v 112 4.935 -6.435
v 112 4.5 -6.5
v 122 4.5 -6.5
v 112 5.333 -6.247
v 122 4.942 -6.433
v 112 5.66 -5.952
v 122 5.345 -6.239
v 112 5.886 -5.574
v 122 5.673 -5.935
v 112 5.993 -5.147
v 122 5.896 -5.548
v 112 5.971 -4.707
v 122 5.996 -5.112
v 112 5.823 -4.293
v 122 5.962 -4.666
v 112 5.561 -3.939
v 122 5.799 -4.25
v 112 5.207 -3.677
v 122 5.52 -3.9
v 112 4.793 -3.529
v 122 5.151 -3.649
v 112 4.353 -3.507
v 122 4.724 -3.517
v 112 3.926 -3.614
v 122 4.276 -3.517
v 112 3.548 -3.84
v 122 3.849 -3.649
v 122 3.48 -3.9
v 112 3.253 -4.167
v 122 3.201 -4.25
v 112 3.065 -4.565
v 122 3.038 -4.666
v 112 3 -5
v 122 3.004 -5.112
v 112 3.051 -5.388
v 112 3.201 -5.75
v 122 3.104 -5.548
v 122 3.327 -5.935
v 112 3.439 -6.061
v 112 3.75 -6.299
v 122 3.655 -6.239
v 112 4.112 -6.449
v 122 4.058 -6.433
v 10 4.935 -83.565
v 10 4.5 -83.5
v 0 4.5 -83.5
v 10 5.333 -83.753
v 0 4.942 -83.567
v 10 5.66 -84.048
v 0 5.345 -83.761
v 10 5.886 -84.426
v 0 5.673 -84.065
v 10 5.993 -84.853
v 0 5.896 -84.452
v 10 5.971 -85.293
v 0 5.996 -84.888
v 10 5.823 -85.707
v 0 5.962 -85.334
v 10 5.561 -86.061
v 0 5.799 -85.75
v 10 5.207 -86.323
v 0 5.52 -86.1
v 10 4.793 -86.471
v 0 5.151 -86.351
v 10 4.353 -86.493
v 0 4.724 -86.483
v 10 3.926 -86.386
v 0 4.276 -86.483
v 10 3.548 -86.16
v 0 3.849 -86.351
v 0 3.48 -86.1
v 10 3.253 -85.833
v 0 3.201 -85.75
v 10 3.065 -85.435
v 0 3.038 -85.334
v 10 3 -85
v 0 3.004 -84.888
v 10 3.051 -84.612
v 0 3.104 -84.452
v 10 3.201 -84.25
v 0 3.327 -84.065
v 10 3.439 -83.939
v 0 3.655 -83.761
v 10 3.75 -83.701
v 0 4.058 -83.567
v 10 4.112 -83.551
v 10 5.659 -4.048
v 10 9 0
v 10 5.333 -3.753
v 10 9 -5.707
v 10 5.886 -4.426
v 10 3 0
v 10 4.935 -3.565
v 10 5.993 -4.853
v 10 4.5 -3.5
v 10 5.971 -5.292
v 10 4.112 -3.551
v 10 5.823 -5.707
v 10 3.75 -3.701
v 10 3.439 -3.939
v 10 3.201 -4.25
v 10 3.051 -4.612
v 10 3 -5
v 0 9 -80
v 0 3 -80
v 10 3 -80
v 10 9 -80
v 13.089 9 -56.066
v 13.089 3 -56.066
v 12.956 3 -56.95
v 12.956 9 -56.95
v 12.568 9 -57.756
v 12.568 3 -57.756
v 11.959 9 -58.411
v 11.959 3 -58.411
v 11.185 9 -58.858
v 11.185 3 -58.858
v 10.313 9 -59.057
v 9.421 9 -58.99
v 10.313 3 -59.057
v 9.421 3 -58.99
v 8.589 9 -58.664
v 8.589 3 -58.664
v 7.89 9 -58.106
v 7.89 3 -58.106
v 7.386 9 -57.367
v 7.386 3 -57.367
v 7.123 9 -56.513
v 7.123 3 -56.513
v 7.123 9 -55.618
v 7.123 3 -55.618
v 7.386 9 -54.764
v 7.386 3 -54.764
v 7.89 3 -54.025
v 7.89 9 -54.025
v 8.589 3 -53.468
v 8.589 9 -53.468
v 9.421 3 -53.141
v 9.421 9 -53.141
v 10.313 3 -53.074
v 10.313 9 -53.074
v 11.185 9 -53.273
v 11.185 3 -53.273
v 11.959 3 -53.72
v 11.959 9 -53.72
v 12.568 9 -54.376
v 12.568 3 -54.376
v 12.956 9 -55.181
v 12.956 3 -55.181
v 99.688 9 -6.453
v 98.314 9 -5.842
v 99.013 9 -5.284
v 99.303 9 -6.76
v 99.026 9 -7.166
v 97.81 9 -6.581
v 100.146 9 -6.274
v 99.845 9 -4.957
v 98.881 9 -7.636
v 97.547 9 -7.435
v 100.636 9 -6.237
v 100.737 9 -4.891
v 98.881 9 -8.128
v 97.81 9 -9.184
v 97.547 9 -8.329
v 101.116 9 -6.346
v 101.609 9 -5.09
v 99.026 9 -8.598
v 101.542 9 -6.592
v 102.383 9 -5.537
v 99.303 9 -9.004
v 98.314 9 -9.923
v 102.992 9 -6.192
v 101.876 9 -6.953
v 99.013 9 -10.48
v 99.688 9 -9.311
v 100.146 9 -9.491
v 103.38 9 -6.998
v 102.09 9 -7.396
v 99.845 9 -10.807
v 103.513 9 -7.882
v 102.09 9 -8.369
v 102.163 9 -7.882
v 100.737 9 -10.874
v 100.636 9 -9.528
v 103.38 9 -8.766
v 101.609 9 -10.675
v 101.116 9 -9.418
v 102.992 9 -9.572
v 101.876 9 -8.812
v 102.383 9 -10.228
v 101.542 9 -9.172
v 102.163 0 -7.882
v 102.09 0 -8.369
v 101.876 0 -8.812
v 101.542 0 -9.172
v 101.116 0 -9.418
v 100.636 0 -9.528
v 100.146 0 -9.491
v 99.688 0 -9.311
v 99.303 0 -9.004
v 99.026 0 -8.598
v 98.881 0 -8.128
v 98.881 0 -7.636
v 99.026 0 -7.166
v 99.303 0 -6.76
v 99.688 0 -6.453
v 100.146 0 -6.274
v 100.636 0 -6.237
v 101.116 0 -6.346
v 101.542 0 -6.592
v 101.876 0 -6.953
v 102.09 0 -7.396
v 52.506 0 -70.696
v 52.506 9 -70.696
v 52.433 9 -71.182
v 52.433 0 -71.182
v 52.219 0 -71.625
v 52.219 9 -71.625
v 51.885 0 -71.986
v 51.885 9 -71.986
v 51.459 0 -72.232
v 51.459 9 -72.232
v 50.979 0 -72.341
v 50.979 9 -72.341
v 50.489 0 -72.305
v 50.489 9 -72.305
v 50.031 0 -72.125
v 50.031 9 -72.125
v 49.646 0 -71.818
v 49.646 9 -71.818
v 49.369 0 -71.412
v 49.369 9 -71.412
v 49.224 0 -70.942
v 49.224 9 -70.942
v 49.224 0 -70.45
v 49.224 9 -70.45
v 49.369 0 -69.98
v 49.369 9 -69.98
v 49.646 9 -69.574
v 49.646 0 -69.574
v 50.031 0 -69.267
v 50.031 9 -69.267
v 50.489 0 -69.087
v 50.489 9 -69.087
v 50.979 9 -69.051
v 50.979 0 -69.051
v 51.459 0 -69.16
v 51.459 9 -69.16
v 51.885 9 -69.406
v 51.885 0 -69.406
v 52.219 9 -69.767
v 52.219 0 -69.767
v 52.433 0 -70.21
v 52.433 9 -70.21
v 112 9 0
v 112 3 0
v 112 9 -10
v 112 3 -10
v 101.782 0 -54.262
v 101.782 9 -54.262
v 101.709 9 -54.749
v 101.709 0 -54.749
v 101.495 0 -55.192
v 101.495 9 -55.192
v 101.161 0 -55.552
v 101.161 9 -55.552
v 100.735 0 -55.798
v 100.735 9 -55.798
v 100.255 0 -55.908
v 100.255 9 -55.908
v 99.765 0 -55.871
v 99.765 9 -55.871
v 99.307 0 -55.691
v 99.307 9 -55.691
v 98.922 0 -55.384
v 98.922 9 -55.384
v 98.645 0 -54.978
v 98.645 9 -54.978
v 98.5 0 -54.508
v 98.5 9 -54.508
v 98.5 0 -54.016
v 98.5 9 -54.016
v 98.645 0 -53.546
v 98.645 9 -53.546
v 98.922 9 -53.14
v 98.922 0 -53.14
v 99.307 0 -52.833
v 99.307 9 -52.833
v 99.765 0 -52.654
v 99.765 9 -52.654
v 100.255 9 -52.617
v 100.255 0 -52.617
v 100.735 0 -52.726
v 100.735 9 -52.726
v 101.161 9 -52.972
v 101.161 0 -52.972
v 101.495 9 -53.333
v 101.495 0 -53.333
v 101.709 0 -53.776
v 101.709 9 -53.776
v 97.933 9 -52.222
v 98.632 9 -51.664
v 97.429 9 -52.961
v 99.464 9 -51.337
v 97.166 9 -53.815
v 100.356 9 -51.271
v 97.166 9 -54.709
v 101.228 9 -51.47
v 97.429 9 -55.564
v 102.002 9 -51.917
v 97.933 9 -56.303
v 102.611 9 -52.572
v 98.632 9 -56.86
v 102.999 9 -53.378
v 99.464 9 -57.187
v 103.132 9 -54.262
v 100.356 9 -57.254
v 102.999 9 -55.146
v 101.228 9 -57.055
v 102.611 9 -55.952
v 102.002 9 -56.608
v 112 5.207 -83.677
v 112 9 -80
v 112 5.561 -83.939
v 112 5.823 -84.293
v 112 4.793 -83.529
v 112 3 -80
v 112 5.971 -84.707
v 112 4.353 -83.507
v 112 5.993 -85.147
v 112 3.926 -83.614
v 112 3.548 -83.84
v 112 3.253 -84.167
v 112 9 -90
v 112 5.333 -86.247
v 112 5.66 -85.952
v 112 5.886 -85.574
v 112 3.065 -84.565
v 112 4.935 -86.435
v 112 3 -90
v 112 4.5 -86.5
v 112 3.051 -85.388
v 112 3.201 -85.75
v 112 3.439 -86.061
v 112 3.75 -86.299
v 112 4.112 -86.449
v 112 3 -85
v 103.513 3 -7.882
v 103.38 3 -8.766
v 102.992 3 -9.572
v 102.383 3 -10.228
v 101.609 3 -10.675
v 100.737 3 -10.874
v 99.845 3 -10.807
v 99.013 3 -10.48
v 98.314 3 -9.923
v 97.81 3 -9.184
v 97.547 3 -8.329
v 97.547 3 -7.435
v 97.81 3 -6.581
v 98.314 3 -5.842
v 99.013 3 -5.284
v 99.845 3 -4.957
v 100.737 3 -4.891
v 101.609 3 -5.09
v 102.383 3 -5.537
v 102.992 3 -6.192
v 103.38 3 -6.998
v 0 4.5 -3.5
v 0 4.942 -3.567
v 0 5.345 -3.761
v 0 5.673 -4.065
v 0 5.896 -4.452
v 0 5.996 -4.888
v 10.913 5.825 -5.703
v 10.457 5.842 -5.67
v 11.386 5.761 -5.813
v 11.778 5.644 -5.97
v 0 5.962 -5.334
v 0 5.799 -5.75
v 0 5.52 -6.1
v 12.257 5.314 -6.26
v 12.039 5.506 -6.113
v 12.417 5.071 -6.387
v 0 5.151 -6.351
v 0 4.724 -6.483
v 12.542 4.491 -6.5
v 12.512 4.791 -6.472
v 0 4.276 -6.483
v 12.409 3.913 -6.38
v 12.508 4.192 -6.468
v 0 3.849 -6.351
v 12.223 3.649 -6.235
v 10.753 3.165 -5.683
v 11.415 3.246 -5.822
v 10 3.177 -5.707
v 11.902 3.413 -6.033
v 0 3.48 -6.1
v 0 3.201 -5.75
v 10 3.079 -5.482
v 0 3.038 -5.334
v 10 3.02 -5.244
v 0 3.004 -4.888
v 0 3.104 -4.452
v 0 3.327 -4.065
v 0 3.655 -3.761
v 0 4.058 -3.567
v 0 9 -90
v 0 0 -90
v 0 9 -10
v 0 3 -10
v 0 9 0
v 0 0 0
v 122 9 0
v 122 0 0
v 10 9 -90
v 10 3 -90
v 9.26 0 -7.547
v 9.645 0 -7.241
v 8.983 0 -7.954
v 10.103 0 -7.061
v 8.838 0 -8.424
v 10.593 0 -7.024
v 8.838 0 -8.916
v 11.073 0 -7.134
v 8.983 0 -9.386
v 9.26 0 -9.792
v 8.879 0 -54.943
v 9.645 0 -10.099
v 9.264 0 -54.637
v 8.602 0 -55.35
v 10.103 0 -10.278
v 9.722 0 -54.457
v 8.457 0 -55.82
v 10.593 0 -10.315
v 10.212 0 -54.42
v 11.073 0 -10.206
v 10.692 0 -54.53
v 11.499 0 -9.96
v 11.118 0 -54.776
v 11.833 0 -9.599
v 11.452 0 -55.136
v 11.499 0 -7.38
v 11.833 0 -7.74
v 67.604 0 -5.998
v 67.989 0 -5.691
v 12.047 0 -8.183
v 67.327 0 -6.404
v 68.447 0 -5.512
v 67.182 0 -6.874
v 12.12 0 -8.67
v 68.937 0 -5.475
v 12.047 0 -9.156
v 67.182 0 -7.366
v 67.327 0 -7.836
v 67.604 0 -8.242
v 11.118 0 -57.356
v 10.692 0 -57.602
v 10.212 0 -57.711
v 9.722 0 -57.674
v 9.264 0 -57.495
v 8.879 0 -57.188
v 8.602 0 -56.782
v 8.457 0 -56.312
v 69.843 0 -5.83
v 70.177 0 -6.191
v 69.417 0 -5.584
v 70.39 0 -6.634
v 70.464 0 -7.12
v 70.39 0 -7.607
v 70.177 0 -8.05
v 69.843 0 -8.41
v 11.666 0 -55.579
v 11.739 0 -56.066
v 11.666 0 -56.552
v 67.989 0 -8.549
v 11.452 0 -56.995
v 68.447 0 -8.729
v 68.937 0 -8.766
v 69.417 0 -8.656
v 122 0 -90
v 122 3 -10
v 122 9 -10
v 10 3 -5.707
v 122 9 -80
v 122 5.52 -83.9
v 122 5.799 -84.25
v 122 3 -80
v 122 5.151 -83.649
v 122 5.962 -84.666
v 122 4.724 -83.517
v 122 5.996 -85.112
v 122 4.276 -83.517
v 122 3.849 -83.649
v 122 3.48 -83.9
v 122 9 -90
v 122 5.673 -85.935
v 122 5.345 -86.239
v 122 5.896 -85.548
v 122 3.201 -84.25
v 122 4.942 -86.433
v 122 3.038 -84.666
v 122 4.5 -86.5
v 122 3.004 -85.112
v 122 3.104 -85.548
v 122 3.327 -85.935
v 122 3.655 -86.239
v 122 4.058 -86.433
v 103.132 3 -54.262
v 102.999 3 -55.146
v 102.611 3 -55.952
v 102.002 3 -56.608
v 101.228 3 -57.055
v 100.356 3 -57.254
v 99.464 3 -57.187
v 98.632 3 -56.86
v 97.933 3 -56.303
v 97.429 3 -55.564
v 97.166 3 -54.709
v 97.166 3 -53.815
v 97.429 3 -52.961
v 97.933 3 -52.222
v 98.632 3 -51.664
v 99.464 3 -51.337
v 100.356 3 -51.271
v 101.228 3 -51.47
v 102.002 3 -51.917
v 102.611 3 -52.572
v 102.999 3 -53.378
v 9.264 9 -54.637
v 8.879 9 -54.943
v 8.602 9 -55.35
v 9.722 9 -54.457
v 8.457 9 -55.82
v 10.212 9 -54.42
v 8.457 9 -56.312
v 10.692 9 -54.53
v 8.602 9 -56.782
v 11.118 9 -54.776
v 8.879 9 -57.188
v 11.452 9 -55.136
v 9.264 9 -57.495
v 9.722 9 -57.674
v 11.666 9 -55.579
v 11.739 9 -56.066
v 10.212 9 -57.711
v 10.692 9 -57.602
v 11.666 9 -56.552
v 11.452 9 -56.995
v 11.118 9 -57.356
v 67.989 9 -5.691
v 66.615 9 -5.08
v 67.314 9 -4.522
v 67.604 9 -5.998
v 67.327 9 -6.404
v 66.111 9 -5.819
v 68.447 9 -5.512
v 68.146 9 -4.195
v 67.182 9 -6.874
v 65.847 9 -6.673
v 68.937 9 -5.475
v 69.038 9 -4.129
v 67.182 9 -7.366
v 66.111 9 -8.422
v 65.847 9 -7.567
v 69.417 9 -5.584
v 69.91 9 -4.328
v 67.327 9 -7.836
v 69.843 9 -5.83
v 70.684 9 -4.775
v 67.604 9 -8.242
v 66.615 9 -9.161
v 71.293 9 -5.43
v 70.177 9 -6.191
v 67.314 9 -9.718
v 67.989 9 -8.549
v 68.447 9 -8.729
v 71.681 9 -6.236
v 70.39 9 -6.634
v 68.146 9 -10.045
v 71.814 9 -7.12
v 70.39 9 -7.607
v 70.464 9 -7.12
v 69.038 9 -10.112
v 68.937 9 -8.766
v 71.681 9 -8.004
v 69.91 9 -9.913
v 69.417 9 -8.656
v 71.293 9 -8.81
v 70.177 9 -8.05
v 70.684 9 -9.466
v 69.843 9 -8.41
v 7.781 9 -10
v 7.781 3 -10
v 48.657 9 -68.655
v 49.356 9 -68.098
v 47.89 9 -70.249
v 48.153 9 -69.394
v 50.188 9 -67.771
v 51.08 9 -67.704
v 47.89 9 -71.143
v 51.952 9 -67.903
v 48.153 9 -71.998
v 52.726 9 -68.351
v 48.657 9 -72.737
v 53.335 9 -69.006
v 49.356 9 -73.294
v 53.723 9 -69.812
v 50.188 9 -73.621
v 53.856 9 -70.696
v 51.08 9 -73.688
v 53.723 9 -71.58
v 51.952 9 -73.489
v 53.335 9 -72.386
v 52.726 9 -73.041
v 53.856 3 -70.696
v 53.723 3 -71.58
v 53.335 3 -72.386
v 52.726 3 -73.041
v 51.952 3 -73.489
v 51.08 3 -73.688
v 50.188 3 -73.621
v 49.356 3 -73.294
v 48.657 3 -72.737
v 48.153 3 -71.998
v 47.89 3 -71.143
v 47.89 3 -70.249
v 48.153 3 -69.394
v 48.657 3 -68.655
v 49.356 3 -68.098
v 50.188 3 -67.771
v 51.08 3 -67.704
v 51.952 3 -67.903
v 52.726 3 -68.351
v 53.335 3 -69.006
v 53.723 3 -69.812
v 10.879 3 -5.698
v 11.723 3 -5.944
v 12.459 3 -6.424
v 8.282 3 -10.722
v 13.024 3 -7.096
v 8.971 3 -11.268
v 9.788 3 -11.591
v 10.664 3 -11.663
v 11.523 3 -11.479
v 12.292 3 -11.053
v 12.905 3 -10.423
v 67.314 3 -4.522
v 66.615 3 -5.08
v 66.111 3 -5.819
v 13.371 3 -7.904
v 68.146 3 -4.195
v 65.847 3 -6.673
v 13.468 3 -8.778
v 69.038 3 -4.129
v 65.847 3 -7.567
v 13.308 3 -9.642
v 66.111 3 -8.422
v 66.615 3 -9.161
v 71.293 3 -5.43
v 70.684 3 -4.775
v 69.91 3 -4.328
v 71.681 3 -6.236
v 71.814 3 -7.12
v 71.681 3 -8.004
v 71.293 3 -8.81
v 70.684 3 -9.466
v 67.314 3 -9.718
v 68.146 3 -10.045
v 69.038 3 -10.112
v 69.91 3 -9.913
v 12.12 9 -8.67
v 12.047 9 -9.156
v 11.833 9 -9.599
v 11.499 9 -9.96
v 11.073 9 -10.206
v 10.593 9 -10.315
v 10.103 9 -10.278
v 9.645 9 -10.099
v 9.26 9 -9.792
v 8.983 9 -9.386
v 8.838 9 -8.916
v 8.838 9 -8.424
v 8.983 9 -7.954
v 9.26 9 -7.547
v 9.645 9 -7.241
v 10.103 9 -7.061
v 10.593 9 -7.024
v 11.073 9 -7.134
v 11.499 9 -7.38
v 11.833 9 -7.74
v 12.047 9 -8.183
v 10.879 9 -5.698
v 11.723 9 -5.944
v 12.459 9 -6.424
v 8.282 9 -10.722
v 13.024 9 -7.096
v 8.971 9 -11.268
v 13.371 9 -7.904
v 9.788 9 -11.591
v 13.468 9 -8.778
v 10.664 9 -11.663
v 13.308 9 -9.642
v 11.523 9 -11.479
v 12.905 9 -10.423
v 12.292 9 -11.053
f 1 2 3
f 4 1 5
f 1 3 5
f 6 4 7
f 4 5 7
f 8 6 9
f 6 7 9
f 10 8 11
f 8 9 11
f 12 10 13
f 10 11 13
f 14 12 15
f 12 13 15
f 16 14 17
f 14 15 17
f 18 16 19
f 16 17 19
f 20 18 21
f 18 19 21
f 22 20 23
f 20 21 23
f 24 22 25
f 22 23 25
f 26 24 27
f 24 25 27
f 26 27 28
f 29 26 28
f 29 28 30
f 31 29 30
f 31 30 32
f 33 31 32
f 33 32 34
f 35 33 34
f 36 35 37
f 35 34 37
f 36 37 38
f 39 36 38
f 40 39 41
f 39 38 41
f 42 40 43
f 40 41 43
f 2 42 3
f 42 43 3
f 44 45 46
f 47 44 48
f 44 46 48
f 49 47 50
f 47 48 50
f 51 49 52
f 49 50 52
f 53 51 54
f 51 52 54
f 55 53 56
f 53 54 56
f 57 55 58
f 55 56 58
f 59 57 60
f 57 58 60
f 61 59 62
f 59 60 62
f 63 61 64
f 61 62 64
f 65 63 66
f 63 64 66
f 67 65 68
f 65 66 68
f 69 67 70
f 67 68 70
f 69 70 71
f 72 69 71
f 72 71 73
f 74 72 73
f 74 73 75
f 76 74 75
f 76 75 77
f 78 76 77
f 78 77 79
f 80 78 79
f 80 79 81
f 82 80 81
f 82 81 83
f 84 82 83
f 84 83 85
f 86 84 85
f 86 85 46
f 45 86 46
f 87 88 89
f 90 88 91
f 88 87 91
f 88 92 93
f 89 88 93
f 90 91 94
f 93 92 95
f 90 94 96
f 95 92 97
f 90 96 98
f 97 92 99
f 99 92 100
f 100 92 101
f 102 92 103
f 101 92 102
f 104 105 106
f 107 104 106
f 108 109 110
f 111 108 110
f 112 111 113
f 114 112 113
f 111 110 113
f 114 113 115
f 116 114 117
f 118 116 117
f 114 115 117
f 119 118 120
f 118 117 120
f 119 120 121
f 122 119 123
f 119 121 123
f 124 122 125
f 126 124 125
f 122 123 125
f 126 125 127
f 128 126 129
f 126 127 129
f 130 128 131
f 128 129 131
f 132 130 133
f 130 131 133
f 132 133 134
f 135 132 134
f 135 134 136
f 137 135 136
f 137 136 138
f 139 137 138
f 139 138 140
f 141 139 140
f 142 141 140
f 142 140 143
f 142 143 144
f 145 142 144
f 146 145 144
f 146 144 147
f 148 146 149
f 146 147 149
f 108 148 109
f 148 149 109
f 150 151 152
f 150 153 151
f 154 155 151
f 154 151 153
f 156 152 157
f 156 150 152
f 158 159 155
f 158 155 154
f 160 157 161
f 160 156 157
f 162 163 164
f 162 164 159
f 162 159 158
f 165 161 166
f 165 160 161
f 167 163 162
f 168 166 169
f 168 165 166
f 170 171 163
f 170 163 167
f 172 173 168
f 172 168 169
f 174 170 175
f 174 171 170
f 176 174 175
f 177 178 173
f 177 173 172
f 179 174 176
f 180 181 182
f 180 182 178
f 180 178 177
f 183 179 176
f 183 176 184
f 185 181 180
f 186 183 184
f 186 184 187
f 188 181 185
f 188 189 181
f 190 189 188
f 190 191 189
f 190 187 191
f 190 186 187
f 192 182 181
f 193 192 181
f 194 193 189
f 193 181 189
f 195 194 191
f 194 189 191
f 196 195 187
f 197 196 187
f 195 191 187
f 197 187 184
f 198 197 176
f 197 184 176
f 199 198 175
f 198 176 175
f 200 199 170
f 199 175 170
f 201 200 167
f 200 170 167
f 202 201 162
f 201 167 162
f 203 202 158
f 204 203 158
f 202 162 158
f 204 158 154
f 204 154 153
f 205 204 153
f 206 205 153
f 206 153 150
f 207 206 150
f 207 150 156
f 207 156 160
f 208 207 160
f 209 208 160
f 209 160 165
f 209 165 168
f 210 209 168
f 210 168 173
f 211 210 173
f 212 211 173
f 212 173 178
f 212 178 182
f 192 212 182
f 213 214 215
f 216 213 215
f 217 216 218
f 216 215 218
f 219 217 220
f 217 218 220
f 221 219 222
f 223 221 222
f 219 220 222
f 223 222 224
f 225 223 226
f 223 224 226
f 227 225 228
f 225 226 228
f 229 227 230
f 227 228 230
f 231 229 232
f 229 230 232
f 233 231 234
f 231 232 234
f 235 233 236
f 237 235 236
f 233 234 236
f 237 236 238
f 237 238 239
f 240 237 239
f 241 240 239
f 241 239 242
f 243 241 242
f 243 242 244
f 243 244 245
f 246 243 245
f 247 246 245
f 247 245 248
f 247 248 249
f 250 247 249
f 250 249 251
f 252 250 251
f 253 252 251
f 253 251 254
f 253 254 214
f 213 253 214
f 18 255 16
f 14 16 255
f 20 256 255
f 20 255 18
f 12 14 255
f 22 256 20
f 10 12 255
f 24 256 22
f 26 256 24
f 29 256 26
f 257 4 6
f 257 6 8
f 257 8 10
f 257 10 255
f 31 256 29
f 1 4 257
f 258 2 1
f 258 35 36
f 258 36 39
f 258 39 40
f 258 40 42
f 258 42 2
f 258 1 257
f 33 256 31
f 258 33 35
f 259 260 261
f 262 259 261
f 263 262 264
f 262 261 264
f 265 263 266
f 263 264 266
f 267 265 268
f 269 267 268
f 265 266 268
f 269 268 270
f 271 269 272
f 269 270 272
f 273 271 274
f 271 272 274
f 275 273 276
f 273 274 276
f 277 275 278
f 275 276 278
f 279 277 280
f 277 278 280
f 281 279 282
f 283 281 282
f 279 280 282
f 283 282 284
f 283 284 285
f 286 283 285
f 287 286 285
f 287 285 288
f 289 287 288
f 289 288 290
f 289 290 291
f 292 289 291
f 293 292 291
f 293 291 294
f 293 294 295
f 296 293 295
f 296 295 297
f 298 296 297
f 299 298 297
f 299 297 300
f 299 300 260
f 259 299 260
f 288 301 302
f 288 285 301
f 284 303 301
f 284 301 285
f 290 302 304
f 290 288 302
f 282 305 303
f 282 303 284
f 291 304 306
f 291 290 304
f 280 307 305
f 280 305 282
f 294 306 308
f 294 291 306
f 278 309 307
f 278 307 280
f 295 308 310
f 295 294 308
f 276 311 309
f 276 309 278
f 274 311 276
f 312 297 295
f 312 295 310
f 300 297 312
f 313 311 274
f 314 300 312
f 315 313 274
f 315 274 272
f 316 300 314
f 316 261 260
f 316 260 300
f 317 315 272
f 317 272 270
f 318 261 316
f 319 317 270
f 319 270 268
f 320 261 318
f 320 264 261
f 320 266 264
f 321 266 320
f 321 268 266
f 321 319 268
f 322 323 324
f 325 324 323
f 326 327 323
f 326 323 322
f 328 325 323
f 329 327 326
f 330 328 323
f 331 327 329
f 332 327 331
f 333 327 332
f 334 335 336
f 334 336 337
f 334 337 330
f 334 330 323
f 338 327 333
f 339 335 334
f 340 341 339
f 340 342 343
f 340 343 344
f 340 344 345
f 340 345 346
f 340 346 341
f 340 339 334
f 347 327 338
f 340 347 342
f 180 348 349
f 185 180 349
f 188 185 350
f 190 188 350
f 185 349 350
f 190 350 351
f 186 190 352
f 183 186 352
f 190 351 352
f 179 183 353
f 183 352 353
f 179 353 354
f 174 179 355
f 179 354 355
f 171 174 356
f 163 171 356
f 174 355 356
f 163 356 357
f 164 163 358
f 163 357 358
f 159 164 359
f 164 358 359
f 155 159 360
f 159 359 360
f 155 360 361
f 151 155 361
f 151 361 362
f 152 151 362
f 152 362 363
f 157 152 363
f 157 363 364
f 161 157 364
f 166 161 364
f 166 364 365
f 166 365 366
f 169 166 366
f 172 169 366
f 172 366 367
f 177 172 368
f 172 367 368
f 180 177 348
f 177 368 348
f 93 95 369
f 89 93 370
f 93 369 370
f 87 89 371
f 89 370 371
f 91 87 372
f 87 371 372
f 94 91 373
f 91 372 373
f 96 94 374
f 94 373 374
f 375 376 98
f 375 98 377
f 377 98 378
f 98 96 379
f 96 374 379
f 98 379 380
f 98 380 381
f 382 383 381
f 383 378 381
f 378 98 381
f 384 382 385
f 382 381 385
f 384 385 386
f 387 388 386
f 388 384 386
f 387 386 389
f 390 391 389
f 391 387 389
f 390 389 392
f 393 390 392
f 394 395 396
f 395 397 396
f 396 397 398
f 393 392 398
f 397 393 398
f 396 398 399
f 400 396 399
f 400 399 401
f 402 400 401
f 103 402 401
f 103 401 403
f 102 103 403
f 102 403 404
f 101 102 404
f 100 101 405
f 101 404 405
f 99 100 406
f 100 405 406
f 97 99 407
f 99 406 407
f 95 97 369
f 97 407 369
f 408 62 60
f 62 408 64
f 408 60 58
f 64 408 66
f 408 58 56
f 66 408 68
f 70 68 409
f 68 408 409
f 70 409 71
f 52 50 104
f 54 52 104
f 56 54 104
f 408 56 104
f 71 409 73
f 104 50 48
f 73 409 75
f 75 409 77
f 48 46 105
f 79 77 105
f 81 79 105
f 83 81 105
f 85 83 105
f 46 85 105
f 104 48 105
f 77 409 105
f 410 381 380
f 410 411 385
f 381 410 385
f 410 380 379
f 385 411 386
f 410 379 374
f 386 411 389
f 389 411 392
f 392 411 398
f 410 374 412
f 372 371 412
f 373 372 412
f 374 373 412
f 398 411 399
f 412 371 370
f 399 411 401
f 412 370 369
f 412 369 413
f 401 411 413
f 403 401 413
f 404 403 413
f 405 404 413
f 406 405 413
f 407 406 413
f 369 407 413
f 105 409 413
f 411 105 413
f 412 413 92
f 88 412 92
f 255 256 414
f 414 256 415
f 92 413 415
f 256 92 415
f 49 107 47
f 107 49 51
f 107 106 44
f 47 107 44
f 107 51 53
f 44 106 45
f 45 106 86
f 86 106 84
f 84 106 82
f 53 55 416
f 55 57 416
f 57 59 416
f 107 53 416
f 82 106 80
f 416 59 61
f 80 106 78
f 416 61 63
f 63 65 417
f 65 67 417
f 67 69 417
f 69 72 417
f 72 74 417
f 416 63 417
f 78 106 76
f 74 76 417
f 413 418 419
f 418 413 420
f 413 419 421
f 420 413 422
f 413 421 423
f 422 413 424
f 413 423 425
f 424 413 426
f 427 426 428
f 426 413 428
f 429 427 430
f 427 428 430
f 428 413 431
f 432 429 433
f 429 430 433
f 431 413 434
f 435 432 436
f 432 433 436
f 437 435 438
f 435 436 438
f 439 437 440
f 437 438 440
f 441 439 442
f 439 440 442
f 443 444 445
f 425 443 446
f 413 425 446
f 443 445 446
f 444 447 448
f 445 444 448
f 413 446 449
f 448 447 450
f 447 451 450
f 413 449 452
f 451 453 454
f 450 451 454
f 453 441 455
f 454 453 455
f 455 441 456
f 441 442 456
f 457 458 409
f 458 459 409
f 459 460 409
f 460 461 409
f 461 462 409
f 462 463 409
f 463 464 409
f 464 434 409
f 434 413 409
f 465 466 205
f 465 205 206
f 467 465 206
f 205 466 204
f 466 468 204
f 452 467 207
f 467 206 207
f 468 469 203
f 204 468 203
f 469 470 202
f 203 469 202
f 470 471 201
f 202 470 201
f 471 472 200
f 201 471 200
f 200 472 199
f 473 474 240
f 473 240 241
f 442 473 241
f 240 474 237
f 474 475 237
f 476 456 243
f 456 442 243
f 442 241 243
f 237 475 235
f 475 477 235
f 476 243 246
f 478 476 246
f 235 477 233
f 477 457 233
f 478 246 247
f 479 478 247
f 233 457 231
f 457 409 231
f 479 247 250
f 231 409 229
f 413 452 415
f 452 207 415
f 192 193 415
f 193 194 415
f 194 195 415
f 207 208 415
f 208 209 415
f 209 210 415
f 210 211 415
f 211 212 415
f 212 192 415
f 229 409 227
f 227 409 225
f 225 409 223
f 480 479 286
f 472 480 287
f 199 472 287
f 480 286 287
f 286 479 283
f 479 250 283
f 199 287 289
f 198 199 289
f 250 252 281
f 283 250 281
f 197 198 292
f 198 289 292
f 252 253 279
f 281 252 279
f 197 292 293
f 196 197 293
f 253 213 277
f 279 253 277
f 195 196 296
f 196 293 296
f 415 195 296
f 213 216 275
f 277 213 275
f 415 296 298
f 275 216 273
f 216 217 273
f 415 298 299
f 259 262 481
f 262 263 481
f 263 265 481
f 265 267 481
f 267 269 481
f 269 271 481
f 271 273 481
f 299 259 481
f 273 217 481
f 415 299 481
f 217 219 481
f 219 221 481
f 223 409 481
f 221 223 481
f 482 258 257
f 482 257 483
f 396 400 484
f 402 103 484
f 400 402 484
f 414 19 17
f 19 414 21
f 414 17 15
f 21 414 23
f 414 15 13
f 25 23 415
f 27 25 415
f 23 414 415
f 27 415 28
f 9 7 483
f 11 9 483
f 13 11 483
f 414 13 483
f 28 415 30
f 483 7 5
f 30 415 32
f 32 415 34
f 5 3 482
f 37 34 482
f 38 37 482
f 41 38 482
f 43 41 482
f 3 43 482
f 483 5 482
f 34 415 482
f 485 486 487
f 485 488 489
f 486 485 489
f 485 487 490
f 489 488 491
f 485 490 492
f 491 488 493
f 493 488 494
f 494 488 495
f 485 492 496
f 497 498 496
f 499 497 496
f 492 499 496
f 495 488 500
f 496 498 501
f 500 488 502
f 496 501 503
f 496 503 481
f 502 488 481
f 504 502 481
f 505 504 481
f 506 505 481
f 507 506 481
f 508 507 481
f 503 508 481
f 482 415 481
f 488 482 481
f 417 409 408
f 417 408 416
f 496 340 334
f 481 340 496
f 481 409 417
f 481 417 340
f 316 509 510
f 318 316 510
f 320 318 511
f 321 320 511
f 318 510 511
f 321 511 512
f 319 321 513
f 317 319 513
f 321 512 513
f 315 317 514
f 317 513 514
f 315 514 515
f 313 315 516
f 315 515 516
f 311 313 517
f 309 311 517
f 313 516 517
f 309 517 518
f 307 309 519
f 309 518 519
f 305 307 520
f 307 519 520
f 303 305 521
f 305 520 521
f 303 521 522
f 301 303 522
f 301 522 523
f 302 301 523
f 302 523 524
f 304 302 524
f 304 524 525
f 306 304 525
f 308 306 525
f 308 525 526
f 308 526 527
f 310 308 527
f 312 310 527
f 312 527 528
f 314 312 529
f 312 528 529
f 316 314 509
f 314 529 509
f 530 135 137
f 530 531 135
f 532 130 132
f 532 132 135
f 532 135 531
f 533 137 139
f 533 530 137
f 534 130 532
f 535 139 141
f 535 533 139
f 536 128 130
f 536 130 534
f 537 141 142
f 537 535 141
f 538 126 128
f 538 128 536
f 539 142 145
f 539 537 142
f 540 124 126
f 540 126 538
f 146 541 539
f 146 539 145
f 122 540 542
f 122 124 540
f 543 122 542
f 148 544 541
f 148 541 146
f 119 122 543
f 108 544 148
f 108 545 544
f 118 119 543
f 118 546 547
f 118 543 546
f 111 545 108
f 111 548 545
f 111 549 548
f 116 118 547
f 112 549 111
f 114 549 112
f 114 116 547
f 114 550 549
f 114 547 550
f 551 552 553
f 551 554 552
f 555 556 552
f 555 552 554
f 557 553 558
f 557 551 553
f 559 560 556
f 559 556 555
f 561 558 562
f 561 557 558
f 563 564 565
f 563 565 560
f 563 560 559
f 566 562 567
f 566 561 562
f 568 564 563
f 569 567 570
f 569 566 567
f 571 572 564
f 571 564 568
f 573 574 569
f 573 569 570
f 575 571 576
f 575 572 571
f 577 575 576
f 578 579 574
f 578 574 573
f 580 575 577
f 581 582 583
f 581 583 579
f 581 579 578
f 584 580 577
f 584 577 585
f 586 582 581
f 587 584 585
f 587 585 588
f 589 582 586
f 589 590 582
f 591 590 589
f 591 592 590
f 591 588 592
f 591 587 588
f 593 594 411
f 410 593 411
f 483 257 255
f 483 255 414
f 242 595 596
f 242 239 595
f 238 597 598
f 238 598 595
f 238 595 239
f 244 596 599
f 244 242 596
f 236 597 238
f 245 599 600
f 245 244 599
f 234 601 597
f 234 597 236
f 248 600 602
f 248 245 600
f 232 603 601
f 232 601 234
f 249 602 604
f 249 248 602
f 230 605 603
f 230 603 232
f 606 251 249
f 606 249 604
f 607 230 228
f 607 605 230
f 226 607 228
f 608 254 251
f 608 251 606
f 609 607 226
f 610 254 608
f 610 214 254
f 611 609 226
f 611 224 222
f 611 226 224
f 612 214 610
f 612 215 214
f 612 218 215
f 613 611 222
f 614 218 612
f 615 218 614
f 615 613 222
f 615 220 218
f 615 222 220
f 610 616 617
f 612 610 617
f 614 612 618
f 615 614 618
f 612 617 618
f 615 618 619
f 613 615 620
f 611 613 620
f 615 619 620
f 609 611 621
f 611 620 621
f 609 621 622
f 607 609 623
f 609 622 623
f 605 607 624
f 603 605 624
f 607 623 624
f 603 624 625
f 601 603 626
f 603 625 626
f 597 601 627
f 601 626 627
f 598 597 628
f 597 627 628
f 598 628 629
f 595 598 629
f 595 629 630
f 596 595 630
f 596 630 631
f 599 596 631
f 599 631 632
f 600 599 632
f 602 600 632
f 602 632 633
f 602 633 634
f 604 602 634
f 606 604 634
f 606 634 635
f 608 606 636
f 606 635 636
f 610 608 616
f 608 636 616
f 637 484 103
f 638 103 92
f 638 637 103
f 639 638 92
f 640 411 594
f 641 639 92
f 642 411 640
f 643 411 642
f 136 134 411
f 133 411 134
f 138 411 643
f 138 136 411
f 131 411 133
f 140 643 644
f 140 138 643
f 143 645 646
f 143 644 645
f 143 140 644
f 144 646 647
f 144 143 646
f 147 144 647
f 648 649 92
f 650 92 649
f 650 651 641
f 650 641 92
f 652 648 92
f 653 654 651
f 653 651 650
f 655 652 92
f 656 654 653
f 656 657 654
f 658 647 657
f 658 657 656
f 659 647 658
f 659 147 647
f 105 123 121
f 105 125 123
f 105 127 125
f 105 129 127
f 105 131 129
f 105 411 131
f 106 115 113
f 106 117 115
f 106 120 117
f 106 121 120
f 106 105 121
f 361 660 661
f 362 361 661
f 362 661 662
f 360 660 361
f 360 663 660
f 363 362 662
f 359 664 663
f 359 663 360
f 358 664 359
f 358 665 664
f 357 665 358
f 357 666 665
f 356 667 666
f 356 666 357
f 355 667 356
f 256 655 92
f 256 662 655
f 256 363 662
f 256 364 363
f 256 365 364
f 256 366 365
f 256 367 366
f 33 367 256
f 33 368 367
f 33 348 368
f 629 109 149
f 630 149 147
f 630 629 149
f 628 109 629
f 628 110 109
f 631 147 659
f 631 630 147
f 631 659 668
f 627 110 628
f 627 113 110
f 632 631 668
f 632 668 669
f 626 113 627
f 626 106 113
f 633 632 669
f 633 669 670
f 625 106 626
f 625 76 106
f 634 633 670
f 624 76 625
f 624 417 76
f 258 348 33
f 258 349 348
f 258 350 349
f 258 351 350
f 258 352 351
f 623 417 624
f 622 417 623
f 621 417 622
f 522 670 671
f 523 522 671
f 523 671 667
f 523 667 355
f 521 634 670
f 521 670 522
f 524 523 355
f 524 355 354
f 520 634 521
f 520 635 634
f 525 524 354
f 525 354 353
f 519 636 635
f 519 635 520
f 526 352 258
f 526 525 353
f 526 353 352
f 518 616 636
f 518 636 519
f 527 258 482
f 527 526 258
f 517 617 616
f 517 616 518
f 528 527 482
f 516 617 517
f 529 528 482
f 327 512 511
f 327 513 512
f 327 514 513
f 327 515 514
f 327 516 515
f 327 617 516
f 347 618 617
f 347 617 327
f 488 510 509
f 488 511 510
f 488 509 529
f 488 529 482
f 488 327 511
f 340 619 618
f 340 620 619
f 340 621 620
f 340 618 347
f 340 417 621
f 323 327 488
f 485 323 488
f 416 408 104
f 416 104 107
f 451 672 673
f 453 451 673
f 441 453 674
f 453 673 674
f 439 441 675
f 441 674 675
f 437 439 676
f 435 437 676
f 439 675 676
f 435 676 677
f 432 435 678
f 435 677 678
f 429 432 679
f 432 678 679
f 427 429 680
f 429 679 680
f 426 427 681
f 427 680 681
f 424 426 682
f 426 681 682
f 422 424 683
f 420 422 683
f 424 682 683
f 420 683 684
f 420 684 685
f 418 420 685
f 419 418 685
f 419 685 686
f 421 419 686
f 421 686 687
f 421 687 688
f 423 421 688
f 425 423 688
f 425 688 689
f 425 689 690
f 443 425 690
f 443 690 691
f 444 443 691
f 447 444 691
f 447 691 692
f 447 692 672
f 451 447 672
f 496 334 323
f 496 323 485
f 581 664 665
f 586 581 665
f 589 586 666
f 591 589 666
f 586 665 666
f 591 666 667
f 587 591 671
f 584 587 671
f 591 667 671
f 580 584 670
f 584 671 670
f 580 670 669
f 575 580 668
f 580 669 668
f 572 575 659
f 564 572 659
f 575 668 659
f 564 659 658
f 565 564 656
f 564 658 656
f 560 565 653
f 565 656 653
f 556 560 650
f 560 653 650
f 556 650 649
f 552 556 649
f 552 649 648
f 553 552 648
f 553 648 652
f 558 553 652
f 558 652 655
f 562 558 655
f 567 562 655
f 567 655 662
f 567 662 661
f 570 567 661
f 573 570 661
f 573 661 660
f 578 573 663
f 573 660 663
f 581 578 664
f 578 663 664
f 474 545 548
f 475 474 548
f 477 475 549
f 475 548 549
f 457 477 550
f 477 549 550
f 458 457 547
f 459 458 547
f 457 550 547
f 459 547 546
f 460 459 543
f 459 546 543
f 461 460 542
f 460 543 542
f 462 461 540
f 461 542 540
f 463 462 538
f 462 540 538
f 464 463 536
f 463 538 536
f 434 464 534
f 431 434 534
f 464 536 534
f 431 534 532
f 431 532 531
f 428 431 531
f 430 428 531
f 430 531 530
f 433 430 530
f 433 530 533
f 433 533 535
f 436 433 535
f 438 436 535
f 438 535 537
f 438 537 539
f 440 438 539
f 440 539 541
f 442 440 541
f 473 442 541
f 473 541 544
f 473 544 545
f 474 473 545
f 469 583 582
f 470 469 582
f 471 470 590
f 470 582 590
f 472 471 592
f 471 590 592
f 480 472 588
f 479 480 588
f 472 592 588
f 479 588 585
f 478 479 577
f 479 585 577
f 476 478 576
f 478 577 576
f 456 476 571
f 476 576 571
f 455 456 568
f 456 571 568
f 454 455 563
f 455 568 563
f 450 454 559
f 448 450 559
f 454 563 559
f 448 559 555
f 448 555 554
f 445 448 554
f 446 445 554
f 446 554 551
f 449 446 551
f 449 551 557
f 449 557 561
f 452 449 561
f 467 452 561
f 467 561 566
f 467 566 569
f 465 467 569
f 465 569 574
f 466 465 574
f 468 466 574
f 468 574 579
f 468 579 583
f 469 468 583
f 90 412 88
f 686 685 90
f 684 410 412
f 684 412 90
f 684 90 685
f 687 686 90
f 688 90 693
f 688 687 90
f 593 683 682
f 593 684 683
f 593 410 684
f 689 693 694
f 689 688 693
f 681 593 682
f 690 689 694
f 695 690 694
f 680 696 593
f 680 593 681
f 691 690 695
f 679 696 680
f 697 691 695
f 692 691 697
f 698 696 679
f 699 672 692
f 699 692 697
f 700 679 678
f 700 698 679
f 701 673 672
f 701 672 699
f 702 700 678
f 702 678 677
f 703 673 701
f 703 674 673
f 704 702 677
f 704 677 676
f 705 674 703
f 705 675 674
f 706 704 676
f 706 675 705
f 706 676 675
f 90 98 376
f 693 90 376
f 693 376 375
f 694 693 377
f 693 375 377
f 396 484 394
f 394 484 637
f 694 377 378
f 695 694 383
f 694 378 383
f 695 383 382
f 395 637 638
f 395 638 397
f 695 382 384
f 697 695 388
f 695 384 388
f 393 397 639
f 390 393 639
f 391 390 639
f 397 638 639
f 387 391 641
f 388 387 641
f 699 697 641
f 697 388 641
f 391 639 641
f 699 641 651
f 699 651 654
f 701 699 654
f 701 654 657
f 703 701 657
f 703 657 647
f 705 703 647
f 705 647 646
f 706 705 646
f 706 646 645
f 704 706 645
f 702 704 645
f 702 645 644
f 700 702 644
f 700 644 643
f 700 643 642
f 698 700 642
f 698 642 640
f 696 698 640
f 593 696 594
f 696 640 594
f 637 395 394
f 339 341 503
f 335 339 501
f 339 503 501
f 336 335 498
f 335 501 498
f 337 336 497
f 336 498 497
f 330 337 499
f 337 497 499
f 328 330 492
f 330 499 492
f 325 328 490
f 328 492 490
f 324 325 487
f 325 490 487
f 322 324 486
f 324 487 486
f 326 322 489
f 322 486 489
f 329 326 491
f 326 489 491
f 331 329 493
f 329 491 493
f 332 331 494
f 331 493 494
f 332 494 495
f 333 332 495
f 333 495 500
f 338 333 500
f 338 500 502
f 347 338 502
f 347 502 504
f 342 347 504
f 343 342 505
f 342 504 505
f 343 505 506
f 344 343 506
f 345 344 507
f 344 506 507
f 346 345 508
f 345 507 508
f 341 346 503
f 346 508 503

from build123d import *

# Parameters (mm, degrees)
SKETCH1_W           = 122
SKETCH1_H           = 90
BOSS_EXTRUDE1_DEPTH = 3
SKETCH2_R           = 3
SKETCH2_W           = 10
SKETCH2_H           = 10
BOSS_EXTRUDE2_DEPTH = 6
SKETCH3_R           = 1.65
CUT_EXTRUDE1_DEPTH  = 26
CUT_EXTRUDE2_REACH  = 124
SKETCH4_R           = 1.5
CUT_EXTRUDE3_REACH  = 124
SKETCH5_R           = 1.5


with BuildPart() as part:
    # Sketch1 → Boss-Extrude1 (new body)
    with BuildSketch(Plane(origin=(0, 0, 0), x_dir=(1, 0, 0), z_dir=(0, 1, 0))):
        with Locations((61, 45)):
            Rectangle(SKETCH1_W, SKETCH1_H)
    extrude(amount=BOSS_EXTRUDE1_DEPTH)

    # Sketch2 → Boss-Extrude2 (add)
    with BuildSketch(Plane(origin=(0, 3, 0), x_dir=(1, 0, 0), z_dir=(0, 1, 0))):
        with Locations((68.8138, 7.1202)):
            Circle(SKETCH2_R)
        with Locations((100.513, 7.8822)):
            Circle(SKETCH2_R)
        with Locations((10.089, 56.0656)):
            Circle(SKETCH2_R)
        with Locations((100.132, 54.2622)):
            Circle(SKETCH2_R)
        with Locations((50.856, 70.696)):
            Circle(SKETCH2_R)
        with BuildLine():
            Line((0, 0), (10, 0))
            Line((10, 0), (10, 5.706645394))
            ThreePointArc((10, 5.706645394), (13.135115844, 10.046973419), (7.781127404, 10))
            Line((7.781127404, 10), (0, 10))
            Line((0, 10), (0, 0))
        make_face()
        with Locations((5, 85)):
            Rectangle(SKETCH2_W, SKETCH2_H)
        with Locations((117, 85)):
            Rectangle(SKETCH2_W, SKETCH2_H)
        with Locations((117, 5)):
            Rectangle(SKETCH2_W, SKETCH2_H)
    extrude(amount=BOSS_EXTRUDE2_DEPTH)

    # Sketch3 → Cut-Extrude1 (cut)
    with BuildSketch(Plane(origin=(0, 9, 0), x_dir=(1, 0, 0), z_dir=(0, 1, 0))):
        with Locations((10.089, 56.0656)):
            Circle(SKETCH3_R)
        with Locations((50.856, 70.696)):
            Circle(SKETCH3_R)
        with Locations((100.132, 54.2622)):
            Circle(SKETCH3_R)
        with Locations((100.513, 7.8822)):
            Circle(SKETCH3_R)
        with Locations((68.8138, 7.1202)):
            Circle(SKETCH3_R)
        with Locations((10.47, 8.6696)):
            Circle(SKETCH3_R)
    extrude(amount=-CUT_EXTRUDE1_DEPTH, mode=Mode.SUBTRACT)

    # Sketch4 → Cut-Extrude2 (cut, up to next)
    with BuildSketch(Plane.ZY, mode=Mode.PRIVATE) as cut_extrude2_sk1:
        with Locations((-85, 4.5)):
            Circle(SKETCH4_R)
    cut_extrude2_tool1 = extrude(cut_extrude2_sk1.sketch, amount=-CUT_EXTRUDE2_REACH, mode=Mode.PRIVATE) & part.part
    add(cut_extrude2_tool1.solids().sort_by_distance((0, 4.5, -85))[0], mode=Mode.SUBTRACT)
    # Sketch4 → Cut-Extrude2 (cut, up to next)
    with BuildSketch(Plane.ZY, mode=Mode.PRIVATE) as cut_extrude2_sk2:
        with Locations((-5, 4.5)):
            Circle(SKETCH4_R)
    cut_extrude2_tool2 = extrude(cut_extrude2_sk2.sketch, amount=-CUT_EXTRUDE2_REACH, mode=Mode.PRIVATE) & part.part
    add(cut_extrude2_tool2.solids().sort_by_distance((0, 4.5, -5))[0], mode=Mode.SUBTRACT)

    # Sketch5 → Cut-Extrude3 (cut, up to next)
    with BuildSketch(Plane(origin=(122, 0, 0), x_dir=(0, 0, -1), z_dir=(1, 0, 0)), mode=Mode.PRIVATE) as cut_extrude3_sk1:
        with Locations((85, 4.5)):
            Circle(SKETCH5_R)
    cut_extrude3_tool1 = extrude(cut_extrude3_sk1.sketch, amount=-CUT_EXTRUDE3_REACH, mode=Mode.PRIVATE) & part.part
    add(cut_extrude3_tool1.solids().sort_by_distance((122, 4.5, -85))[0], mode=Mode.SUBTRACT)
    # Sketch5 → Cut-Extrude3 (cut, up to next)
    with BuildSketch(Plane(origin=(122, 0, 0), x_dir=(0, 0, -1), z_dir=(1, 0, 0)), mode=Mode.PRIVATE) as cut_extrude3_sk2:
        with Locations((5, 4.5)):
            Circle(SKETCH5_R)
    cut_extrude3_tool2 = extrude(cut_extrude3_sk2.sketch, amount=-CUT_EXTRUDE3_REACH, mode=Mode.PRIVATE) & part.part
    add(cut_extrude3_tool2.solids().sort_by_distance((122, 4.5, -5))[0], mode=Mode.SUBTRACT)


solid = part.part
